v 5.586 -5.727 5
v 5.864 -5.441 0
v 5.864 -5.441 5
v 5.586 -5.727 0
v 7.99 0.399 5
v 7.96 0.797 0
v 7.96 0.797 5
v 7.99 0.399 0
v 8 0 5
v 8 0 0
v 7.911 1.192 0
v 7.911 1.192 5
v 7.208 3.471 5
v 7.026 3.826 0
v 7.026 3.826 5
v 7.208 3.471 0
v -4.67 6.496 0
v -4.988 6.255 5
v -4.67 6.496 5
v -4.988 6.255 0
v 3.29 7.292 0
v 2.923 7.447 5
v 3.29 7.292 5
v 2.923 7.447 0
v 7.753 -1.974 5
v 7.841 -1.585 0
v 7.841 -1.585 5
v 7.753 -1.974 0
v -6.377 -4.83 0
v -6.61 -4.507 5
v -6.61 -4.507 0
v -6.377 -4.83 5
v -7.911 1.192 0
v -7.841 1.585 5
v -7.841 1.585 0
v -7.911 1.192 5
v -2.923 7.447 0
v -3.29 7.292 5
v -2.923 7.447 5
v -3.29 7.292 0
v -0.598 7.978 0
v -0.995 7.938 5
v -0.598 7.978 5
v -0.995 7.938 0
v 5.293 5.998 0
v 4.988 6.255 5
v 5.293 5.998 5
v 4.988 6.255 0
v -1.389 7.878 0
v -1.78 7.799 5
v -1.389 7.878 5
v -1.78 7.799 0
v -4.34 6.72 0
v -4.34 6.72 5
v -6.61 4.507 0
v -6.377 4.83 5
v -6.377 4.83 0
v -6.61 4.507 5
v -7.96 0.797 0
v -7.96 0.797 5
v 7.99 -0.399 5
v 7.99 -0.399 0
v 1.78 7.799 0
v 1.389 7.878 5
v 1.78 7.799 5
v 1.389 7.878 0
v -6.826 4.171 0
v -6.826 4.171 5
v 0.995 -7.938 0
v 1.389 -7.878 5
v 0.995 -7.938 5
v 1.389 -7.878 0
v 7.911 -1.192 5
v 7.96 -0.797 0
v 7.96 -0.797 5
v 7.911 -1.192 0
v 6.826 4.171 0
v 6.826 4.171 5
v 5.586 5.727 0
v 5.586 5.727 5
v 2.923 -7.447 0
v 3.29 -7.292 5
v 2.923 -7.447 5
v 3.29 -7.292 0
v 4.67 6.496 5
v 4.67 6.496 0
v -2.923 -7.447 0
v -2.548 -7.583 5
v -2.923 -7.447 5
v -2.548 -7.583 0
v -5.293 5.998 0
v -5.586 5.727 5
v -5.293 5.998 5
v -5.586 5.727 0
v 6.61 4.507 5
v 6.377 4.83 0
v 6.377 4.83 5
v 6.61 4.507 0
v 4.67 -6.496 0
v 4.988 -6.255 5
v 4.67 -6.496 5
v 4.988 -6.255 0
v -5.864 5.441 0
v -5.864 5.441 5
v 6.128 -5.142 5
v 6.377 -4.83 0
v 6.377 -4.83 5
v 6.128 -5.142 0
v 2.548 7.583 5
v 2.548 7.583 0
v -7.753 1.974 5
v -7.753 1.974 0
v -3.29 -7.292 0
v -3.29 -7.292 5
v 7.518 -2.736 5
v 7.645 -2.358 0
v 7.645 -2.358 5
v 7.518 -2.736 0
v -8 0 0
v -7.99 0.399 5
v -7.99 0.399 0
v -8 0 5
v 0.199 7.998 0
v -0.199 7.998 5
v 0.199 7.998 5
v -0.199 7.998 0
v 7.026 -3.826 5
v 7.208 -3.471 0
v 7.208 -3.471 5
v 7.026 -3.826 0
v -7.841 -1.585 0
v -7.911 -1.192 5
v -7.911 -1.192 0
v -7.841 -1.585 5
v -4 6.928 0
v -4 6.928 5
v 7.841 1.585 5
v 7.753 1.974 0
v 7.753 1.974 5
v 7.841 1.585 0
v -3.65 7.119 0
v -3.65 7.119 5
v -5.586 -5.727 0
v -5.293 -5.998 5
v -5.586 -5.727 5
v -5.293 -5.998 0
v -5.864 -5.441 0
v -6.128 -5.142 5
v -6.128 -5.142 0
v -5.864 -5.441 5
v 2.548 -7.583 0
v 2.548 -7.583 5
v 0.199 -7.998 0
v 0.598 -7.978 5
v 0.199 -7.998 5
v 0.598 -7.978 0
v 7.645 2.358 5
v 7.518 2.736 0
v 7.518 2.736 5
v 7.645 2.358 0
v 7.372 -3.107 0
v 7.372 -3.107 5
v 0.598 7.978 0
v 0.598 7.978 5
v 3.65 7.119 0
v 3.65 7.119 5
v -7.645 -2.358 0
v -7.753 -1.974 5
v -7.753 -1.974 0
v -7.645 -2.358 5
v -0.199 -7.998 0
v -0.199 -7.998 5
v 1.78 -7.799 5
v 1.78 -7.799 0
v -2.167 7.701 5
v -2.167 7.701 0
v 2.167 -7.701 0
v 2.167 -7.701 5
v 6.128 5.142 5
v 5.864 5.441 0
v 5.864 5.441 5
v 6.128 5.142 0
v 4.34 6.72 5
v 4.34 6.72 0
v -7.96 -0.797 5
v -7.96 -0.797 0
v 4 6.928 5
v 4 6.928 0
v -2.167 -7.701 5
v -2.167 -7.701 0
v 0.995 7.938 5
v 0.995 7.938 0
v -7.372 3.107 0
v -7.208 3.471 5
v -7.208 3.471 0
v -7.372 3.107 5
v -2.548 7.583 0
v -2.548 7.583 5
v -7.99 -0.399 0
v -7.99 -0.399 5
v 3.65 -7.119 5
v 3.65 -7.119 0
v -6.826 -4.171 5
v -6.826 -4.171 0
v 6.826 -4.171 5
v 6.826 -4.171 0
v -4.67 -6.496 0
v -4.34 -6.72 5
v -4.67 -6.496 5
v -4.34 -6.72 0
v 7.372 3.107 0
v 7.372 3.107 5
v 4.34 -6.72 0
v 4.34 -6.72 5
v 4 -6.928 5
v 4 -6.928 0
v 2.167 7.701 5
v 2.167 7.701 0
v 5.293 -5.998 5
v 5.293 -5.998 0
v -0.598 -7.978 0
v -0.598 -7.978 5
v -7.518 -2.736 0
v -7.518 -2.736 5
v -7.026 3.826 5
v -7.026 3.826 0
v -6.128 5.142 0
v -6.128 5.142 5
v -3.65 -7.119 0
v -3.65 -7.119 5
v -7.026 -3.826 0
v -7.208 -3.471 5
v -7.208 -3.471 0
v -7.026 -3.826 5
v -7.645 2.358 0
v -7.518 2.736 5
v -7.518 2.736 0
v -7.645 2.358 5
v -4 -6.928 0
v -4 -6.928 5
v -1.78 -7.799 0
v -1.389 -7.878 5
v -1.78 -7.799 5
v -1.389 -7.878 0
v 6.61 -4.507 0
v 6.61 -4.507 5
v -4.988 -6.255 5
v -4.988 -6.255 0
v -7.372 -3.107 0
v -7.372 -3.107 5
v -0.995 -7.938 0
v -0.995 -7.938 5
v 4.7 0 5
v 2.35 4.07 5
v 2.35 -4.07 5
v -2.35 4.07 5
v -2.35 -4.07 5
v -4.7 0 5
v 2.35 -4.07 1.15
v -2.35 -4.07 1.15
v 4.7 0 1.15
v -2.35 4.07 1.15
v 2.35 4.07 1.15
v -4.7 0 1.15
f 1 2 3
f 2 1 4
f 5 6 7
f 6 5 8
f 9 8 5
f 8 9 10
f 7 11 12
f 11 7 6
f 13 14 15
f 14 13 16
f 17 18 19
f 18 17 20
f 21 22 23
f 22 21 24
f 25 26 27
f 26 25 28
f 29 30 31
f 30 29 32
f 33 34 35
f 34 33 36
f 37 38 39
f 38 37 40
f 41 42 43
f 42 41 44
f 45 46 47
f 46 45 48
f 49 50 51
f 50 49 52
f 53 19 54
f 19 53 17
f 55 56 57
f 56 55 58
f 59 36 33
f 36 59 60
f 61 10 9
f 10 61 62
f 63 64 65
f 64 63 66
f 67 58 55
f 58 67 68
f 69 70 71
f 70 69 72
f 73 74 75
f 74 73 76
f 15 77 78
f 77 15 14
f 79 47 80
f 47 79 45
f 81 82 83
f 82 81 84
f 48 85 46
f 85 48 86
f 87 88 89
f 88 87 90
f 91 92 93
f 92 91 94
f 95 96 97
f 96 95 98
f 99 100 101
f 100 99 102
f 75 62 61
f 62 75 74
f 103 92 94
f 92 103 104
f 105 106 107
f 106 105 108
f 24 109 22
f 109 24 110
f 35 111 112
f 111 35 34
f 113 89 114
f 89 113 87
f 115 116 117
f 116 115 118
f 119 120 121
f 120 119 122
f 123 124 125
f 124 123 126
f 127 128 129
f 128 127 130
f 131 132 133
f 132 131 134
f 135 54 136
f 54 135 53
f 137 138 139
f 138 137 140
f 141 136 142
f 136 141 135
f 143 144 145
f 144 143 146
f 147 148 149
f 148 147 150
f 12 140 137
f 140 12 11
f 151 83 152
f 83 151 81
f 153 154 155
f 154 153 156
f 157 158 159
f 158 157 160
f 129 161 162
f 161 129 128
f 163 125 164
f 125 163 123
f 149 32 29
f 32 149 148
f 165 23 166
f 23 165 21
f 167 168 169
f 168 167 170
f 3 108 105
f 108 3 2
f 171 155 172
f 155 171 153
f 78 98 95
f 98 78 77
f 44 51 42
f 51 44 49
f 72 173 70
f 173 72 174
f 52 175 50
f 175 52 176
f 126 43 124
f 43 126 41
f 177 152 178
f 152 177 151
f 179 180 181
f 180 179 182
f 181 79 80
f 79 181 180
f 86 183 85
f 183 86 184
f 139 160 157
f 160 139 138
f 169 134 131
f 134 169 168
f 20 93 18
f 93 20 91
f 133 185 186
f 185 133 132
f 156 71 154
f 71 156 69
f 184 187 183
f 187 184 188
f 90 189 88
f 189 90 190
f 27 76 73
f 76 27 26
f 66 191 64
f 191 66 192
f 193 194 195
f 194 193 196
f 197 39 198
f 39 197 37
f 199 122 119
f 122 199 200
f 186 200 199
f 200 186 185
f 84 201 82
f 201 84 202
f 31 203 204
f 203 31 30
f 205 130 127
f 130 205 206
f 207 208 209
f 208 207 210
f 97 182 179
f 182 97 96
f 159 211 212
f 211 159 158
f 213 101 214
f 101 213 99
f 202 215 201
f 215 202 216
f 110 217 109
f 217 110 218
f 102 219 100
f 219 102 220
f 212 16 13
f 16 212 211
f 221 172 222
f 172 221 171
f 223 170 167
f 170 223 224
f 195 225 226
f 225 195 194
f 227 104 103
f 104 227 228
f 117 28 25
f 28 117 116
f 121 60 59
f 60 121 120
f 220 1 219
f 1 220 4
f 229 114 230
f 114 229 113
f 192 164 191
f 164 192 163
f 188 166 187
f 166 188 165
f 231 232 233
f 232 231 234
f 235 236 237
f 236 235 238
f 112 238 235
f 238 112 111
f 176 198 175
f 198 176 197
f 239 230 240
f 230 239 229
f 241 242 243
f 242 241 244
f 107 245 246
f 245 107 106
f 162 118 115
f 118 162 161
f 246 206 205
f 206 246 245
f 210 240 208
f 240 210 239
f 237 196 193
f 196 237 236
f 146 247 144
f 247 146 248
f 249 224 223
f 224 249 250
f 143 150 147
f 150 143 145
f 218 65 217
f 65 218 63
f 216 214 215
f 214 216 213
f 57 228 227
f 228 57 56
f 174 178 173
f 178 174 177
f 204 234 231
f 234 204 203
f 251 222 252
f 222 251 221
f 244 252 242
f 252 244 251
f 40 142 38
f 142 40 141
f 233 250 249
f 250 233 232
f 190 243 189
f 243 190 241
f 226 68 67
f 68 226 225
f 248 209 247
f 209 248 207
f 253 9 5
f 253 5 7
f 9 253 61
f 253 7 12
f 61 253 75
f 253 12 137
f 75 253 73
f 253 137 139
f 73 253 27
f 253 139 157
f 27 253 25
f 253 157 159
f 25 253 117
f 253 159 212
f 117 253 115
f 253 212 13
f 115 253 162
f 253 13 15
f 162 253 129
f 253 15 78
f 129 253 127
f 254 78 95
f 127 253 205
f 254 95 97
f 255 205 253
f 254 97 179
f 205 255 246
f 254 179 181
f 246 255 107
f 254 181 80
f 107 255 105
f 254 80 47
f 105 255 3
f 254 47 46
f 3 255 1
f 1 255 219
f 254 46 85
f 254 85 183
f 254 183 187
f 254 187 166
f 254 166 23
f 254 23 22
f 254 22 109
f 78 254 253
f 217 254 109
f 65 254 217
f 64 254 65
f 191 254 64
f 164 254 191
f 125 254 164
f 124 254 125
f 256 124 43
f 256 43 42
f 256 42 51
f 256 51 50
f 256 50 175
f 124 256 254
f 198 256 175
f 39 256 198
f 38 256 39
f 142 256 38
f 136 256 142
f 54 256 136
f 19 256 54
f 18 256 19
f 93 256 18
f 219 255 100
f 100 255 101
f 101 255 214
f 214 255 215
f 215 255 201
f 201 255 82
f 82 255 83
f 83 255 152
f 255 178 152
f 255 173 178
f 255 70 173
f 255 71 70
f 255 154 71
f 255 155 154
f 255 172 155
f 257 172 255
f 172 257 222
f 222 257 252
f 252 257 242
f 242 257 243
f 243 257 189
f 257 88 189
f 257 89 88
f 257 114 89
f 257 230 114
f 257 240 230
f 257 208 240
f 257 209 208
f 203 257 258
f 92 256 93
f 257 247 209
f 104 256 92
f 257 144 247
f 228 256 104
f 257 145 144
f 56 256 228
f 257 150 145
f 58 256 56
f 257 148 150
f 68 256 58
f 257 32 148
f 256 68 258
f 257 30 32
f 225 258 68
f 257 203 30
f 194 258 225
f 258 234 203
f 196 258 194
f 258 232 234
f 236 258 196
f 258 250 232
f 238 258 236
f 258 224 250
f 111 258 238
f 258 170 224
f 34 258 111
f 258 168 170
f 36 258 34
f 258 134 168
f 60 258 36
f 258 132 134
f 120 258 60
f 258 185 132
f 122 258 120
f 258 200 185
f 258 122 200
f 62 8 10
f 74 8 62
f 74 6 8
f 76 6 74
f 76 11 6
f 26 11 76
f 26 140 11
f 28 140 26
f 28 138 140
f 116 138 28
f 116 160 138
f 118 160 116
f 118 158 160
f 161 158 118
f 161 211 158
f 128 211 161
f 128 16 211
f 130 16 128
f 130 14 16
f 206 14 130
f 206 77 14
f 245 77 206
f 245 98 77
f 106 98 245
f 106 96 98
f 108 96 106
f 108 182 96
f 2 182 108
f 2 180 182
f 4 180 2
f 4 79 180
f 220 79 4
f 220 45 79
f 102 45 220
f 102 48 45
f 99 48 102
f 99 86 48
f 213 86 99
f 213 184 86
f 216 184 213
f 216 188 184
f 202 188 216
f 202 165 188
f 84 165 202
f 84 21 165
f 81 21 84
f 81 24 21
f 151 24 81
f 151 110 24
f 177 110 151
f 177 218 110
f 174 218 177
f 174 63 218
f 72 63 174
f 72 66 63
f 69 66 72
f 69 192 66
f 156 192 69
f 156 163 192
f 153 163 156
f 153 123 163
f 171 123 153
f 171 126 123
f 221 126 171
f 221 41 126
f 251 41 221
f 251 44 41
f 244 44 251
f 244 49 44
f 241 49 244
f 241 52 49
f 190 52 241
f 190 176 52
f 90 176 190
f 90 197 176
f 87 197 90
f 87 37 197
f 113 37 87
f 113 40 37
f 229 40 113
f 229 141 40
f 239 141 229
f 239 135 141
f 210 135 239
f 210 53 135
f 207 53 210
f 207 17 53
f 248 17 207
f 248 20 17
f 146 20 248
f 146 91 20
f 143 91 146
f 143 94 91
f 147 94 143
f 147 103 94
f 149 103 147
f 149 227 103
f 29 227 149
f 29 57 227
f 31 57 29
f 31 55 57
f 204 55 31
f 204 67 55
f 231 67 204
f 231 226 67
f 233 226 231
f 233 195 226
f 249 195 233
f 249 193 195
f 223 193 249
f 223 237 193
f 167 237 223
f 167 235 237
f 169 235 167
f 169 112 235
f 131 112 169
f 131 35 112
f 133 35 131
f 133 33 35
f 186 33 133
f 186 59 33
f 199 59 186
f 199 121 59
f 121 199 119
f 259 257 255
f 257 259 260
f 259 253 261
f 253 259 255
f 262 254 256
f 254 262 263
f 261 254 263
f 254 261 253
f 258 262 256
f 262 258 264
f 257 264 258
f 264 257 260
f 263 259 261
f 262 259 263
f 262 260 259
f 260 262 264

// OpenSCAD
use <MCAD/nuts_and_bolts.scad>;
include <MCAD/units.scad>;

// with my printer, tolerance=0.1 seems to work well

$fa = 1;
$fs = 0.4;

H=5;
NUT_H = 3.85;

difference() {
    cylinder(h=H, r=8);
    translate([0, 0, H-NUT_H+0.0001])
        resize([0, 0, NUT_H])
        nutHole(M5, tolerance=0.1);
}
